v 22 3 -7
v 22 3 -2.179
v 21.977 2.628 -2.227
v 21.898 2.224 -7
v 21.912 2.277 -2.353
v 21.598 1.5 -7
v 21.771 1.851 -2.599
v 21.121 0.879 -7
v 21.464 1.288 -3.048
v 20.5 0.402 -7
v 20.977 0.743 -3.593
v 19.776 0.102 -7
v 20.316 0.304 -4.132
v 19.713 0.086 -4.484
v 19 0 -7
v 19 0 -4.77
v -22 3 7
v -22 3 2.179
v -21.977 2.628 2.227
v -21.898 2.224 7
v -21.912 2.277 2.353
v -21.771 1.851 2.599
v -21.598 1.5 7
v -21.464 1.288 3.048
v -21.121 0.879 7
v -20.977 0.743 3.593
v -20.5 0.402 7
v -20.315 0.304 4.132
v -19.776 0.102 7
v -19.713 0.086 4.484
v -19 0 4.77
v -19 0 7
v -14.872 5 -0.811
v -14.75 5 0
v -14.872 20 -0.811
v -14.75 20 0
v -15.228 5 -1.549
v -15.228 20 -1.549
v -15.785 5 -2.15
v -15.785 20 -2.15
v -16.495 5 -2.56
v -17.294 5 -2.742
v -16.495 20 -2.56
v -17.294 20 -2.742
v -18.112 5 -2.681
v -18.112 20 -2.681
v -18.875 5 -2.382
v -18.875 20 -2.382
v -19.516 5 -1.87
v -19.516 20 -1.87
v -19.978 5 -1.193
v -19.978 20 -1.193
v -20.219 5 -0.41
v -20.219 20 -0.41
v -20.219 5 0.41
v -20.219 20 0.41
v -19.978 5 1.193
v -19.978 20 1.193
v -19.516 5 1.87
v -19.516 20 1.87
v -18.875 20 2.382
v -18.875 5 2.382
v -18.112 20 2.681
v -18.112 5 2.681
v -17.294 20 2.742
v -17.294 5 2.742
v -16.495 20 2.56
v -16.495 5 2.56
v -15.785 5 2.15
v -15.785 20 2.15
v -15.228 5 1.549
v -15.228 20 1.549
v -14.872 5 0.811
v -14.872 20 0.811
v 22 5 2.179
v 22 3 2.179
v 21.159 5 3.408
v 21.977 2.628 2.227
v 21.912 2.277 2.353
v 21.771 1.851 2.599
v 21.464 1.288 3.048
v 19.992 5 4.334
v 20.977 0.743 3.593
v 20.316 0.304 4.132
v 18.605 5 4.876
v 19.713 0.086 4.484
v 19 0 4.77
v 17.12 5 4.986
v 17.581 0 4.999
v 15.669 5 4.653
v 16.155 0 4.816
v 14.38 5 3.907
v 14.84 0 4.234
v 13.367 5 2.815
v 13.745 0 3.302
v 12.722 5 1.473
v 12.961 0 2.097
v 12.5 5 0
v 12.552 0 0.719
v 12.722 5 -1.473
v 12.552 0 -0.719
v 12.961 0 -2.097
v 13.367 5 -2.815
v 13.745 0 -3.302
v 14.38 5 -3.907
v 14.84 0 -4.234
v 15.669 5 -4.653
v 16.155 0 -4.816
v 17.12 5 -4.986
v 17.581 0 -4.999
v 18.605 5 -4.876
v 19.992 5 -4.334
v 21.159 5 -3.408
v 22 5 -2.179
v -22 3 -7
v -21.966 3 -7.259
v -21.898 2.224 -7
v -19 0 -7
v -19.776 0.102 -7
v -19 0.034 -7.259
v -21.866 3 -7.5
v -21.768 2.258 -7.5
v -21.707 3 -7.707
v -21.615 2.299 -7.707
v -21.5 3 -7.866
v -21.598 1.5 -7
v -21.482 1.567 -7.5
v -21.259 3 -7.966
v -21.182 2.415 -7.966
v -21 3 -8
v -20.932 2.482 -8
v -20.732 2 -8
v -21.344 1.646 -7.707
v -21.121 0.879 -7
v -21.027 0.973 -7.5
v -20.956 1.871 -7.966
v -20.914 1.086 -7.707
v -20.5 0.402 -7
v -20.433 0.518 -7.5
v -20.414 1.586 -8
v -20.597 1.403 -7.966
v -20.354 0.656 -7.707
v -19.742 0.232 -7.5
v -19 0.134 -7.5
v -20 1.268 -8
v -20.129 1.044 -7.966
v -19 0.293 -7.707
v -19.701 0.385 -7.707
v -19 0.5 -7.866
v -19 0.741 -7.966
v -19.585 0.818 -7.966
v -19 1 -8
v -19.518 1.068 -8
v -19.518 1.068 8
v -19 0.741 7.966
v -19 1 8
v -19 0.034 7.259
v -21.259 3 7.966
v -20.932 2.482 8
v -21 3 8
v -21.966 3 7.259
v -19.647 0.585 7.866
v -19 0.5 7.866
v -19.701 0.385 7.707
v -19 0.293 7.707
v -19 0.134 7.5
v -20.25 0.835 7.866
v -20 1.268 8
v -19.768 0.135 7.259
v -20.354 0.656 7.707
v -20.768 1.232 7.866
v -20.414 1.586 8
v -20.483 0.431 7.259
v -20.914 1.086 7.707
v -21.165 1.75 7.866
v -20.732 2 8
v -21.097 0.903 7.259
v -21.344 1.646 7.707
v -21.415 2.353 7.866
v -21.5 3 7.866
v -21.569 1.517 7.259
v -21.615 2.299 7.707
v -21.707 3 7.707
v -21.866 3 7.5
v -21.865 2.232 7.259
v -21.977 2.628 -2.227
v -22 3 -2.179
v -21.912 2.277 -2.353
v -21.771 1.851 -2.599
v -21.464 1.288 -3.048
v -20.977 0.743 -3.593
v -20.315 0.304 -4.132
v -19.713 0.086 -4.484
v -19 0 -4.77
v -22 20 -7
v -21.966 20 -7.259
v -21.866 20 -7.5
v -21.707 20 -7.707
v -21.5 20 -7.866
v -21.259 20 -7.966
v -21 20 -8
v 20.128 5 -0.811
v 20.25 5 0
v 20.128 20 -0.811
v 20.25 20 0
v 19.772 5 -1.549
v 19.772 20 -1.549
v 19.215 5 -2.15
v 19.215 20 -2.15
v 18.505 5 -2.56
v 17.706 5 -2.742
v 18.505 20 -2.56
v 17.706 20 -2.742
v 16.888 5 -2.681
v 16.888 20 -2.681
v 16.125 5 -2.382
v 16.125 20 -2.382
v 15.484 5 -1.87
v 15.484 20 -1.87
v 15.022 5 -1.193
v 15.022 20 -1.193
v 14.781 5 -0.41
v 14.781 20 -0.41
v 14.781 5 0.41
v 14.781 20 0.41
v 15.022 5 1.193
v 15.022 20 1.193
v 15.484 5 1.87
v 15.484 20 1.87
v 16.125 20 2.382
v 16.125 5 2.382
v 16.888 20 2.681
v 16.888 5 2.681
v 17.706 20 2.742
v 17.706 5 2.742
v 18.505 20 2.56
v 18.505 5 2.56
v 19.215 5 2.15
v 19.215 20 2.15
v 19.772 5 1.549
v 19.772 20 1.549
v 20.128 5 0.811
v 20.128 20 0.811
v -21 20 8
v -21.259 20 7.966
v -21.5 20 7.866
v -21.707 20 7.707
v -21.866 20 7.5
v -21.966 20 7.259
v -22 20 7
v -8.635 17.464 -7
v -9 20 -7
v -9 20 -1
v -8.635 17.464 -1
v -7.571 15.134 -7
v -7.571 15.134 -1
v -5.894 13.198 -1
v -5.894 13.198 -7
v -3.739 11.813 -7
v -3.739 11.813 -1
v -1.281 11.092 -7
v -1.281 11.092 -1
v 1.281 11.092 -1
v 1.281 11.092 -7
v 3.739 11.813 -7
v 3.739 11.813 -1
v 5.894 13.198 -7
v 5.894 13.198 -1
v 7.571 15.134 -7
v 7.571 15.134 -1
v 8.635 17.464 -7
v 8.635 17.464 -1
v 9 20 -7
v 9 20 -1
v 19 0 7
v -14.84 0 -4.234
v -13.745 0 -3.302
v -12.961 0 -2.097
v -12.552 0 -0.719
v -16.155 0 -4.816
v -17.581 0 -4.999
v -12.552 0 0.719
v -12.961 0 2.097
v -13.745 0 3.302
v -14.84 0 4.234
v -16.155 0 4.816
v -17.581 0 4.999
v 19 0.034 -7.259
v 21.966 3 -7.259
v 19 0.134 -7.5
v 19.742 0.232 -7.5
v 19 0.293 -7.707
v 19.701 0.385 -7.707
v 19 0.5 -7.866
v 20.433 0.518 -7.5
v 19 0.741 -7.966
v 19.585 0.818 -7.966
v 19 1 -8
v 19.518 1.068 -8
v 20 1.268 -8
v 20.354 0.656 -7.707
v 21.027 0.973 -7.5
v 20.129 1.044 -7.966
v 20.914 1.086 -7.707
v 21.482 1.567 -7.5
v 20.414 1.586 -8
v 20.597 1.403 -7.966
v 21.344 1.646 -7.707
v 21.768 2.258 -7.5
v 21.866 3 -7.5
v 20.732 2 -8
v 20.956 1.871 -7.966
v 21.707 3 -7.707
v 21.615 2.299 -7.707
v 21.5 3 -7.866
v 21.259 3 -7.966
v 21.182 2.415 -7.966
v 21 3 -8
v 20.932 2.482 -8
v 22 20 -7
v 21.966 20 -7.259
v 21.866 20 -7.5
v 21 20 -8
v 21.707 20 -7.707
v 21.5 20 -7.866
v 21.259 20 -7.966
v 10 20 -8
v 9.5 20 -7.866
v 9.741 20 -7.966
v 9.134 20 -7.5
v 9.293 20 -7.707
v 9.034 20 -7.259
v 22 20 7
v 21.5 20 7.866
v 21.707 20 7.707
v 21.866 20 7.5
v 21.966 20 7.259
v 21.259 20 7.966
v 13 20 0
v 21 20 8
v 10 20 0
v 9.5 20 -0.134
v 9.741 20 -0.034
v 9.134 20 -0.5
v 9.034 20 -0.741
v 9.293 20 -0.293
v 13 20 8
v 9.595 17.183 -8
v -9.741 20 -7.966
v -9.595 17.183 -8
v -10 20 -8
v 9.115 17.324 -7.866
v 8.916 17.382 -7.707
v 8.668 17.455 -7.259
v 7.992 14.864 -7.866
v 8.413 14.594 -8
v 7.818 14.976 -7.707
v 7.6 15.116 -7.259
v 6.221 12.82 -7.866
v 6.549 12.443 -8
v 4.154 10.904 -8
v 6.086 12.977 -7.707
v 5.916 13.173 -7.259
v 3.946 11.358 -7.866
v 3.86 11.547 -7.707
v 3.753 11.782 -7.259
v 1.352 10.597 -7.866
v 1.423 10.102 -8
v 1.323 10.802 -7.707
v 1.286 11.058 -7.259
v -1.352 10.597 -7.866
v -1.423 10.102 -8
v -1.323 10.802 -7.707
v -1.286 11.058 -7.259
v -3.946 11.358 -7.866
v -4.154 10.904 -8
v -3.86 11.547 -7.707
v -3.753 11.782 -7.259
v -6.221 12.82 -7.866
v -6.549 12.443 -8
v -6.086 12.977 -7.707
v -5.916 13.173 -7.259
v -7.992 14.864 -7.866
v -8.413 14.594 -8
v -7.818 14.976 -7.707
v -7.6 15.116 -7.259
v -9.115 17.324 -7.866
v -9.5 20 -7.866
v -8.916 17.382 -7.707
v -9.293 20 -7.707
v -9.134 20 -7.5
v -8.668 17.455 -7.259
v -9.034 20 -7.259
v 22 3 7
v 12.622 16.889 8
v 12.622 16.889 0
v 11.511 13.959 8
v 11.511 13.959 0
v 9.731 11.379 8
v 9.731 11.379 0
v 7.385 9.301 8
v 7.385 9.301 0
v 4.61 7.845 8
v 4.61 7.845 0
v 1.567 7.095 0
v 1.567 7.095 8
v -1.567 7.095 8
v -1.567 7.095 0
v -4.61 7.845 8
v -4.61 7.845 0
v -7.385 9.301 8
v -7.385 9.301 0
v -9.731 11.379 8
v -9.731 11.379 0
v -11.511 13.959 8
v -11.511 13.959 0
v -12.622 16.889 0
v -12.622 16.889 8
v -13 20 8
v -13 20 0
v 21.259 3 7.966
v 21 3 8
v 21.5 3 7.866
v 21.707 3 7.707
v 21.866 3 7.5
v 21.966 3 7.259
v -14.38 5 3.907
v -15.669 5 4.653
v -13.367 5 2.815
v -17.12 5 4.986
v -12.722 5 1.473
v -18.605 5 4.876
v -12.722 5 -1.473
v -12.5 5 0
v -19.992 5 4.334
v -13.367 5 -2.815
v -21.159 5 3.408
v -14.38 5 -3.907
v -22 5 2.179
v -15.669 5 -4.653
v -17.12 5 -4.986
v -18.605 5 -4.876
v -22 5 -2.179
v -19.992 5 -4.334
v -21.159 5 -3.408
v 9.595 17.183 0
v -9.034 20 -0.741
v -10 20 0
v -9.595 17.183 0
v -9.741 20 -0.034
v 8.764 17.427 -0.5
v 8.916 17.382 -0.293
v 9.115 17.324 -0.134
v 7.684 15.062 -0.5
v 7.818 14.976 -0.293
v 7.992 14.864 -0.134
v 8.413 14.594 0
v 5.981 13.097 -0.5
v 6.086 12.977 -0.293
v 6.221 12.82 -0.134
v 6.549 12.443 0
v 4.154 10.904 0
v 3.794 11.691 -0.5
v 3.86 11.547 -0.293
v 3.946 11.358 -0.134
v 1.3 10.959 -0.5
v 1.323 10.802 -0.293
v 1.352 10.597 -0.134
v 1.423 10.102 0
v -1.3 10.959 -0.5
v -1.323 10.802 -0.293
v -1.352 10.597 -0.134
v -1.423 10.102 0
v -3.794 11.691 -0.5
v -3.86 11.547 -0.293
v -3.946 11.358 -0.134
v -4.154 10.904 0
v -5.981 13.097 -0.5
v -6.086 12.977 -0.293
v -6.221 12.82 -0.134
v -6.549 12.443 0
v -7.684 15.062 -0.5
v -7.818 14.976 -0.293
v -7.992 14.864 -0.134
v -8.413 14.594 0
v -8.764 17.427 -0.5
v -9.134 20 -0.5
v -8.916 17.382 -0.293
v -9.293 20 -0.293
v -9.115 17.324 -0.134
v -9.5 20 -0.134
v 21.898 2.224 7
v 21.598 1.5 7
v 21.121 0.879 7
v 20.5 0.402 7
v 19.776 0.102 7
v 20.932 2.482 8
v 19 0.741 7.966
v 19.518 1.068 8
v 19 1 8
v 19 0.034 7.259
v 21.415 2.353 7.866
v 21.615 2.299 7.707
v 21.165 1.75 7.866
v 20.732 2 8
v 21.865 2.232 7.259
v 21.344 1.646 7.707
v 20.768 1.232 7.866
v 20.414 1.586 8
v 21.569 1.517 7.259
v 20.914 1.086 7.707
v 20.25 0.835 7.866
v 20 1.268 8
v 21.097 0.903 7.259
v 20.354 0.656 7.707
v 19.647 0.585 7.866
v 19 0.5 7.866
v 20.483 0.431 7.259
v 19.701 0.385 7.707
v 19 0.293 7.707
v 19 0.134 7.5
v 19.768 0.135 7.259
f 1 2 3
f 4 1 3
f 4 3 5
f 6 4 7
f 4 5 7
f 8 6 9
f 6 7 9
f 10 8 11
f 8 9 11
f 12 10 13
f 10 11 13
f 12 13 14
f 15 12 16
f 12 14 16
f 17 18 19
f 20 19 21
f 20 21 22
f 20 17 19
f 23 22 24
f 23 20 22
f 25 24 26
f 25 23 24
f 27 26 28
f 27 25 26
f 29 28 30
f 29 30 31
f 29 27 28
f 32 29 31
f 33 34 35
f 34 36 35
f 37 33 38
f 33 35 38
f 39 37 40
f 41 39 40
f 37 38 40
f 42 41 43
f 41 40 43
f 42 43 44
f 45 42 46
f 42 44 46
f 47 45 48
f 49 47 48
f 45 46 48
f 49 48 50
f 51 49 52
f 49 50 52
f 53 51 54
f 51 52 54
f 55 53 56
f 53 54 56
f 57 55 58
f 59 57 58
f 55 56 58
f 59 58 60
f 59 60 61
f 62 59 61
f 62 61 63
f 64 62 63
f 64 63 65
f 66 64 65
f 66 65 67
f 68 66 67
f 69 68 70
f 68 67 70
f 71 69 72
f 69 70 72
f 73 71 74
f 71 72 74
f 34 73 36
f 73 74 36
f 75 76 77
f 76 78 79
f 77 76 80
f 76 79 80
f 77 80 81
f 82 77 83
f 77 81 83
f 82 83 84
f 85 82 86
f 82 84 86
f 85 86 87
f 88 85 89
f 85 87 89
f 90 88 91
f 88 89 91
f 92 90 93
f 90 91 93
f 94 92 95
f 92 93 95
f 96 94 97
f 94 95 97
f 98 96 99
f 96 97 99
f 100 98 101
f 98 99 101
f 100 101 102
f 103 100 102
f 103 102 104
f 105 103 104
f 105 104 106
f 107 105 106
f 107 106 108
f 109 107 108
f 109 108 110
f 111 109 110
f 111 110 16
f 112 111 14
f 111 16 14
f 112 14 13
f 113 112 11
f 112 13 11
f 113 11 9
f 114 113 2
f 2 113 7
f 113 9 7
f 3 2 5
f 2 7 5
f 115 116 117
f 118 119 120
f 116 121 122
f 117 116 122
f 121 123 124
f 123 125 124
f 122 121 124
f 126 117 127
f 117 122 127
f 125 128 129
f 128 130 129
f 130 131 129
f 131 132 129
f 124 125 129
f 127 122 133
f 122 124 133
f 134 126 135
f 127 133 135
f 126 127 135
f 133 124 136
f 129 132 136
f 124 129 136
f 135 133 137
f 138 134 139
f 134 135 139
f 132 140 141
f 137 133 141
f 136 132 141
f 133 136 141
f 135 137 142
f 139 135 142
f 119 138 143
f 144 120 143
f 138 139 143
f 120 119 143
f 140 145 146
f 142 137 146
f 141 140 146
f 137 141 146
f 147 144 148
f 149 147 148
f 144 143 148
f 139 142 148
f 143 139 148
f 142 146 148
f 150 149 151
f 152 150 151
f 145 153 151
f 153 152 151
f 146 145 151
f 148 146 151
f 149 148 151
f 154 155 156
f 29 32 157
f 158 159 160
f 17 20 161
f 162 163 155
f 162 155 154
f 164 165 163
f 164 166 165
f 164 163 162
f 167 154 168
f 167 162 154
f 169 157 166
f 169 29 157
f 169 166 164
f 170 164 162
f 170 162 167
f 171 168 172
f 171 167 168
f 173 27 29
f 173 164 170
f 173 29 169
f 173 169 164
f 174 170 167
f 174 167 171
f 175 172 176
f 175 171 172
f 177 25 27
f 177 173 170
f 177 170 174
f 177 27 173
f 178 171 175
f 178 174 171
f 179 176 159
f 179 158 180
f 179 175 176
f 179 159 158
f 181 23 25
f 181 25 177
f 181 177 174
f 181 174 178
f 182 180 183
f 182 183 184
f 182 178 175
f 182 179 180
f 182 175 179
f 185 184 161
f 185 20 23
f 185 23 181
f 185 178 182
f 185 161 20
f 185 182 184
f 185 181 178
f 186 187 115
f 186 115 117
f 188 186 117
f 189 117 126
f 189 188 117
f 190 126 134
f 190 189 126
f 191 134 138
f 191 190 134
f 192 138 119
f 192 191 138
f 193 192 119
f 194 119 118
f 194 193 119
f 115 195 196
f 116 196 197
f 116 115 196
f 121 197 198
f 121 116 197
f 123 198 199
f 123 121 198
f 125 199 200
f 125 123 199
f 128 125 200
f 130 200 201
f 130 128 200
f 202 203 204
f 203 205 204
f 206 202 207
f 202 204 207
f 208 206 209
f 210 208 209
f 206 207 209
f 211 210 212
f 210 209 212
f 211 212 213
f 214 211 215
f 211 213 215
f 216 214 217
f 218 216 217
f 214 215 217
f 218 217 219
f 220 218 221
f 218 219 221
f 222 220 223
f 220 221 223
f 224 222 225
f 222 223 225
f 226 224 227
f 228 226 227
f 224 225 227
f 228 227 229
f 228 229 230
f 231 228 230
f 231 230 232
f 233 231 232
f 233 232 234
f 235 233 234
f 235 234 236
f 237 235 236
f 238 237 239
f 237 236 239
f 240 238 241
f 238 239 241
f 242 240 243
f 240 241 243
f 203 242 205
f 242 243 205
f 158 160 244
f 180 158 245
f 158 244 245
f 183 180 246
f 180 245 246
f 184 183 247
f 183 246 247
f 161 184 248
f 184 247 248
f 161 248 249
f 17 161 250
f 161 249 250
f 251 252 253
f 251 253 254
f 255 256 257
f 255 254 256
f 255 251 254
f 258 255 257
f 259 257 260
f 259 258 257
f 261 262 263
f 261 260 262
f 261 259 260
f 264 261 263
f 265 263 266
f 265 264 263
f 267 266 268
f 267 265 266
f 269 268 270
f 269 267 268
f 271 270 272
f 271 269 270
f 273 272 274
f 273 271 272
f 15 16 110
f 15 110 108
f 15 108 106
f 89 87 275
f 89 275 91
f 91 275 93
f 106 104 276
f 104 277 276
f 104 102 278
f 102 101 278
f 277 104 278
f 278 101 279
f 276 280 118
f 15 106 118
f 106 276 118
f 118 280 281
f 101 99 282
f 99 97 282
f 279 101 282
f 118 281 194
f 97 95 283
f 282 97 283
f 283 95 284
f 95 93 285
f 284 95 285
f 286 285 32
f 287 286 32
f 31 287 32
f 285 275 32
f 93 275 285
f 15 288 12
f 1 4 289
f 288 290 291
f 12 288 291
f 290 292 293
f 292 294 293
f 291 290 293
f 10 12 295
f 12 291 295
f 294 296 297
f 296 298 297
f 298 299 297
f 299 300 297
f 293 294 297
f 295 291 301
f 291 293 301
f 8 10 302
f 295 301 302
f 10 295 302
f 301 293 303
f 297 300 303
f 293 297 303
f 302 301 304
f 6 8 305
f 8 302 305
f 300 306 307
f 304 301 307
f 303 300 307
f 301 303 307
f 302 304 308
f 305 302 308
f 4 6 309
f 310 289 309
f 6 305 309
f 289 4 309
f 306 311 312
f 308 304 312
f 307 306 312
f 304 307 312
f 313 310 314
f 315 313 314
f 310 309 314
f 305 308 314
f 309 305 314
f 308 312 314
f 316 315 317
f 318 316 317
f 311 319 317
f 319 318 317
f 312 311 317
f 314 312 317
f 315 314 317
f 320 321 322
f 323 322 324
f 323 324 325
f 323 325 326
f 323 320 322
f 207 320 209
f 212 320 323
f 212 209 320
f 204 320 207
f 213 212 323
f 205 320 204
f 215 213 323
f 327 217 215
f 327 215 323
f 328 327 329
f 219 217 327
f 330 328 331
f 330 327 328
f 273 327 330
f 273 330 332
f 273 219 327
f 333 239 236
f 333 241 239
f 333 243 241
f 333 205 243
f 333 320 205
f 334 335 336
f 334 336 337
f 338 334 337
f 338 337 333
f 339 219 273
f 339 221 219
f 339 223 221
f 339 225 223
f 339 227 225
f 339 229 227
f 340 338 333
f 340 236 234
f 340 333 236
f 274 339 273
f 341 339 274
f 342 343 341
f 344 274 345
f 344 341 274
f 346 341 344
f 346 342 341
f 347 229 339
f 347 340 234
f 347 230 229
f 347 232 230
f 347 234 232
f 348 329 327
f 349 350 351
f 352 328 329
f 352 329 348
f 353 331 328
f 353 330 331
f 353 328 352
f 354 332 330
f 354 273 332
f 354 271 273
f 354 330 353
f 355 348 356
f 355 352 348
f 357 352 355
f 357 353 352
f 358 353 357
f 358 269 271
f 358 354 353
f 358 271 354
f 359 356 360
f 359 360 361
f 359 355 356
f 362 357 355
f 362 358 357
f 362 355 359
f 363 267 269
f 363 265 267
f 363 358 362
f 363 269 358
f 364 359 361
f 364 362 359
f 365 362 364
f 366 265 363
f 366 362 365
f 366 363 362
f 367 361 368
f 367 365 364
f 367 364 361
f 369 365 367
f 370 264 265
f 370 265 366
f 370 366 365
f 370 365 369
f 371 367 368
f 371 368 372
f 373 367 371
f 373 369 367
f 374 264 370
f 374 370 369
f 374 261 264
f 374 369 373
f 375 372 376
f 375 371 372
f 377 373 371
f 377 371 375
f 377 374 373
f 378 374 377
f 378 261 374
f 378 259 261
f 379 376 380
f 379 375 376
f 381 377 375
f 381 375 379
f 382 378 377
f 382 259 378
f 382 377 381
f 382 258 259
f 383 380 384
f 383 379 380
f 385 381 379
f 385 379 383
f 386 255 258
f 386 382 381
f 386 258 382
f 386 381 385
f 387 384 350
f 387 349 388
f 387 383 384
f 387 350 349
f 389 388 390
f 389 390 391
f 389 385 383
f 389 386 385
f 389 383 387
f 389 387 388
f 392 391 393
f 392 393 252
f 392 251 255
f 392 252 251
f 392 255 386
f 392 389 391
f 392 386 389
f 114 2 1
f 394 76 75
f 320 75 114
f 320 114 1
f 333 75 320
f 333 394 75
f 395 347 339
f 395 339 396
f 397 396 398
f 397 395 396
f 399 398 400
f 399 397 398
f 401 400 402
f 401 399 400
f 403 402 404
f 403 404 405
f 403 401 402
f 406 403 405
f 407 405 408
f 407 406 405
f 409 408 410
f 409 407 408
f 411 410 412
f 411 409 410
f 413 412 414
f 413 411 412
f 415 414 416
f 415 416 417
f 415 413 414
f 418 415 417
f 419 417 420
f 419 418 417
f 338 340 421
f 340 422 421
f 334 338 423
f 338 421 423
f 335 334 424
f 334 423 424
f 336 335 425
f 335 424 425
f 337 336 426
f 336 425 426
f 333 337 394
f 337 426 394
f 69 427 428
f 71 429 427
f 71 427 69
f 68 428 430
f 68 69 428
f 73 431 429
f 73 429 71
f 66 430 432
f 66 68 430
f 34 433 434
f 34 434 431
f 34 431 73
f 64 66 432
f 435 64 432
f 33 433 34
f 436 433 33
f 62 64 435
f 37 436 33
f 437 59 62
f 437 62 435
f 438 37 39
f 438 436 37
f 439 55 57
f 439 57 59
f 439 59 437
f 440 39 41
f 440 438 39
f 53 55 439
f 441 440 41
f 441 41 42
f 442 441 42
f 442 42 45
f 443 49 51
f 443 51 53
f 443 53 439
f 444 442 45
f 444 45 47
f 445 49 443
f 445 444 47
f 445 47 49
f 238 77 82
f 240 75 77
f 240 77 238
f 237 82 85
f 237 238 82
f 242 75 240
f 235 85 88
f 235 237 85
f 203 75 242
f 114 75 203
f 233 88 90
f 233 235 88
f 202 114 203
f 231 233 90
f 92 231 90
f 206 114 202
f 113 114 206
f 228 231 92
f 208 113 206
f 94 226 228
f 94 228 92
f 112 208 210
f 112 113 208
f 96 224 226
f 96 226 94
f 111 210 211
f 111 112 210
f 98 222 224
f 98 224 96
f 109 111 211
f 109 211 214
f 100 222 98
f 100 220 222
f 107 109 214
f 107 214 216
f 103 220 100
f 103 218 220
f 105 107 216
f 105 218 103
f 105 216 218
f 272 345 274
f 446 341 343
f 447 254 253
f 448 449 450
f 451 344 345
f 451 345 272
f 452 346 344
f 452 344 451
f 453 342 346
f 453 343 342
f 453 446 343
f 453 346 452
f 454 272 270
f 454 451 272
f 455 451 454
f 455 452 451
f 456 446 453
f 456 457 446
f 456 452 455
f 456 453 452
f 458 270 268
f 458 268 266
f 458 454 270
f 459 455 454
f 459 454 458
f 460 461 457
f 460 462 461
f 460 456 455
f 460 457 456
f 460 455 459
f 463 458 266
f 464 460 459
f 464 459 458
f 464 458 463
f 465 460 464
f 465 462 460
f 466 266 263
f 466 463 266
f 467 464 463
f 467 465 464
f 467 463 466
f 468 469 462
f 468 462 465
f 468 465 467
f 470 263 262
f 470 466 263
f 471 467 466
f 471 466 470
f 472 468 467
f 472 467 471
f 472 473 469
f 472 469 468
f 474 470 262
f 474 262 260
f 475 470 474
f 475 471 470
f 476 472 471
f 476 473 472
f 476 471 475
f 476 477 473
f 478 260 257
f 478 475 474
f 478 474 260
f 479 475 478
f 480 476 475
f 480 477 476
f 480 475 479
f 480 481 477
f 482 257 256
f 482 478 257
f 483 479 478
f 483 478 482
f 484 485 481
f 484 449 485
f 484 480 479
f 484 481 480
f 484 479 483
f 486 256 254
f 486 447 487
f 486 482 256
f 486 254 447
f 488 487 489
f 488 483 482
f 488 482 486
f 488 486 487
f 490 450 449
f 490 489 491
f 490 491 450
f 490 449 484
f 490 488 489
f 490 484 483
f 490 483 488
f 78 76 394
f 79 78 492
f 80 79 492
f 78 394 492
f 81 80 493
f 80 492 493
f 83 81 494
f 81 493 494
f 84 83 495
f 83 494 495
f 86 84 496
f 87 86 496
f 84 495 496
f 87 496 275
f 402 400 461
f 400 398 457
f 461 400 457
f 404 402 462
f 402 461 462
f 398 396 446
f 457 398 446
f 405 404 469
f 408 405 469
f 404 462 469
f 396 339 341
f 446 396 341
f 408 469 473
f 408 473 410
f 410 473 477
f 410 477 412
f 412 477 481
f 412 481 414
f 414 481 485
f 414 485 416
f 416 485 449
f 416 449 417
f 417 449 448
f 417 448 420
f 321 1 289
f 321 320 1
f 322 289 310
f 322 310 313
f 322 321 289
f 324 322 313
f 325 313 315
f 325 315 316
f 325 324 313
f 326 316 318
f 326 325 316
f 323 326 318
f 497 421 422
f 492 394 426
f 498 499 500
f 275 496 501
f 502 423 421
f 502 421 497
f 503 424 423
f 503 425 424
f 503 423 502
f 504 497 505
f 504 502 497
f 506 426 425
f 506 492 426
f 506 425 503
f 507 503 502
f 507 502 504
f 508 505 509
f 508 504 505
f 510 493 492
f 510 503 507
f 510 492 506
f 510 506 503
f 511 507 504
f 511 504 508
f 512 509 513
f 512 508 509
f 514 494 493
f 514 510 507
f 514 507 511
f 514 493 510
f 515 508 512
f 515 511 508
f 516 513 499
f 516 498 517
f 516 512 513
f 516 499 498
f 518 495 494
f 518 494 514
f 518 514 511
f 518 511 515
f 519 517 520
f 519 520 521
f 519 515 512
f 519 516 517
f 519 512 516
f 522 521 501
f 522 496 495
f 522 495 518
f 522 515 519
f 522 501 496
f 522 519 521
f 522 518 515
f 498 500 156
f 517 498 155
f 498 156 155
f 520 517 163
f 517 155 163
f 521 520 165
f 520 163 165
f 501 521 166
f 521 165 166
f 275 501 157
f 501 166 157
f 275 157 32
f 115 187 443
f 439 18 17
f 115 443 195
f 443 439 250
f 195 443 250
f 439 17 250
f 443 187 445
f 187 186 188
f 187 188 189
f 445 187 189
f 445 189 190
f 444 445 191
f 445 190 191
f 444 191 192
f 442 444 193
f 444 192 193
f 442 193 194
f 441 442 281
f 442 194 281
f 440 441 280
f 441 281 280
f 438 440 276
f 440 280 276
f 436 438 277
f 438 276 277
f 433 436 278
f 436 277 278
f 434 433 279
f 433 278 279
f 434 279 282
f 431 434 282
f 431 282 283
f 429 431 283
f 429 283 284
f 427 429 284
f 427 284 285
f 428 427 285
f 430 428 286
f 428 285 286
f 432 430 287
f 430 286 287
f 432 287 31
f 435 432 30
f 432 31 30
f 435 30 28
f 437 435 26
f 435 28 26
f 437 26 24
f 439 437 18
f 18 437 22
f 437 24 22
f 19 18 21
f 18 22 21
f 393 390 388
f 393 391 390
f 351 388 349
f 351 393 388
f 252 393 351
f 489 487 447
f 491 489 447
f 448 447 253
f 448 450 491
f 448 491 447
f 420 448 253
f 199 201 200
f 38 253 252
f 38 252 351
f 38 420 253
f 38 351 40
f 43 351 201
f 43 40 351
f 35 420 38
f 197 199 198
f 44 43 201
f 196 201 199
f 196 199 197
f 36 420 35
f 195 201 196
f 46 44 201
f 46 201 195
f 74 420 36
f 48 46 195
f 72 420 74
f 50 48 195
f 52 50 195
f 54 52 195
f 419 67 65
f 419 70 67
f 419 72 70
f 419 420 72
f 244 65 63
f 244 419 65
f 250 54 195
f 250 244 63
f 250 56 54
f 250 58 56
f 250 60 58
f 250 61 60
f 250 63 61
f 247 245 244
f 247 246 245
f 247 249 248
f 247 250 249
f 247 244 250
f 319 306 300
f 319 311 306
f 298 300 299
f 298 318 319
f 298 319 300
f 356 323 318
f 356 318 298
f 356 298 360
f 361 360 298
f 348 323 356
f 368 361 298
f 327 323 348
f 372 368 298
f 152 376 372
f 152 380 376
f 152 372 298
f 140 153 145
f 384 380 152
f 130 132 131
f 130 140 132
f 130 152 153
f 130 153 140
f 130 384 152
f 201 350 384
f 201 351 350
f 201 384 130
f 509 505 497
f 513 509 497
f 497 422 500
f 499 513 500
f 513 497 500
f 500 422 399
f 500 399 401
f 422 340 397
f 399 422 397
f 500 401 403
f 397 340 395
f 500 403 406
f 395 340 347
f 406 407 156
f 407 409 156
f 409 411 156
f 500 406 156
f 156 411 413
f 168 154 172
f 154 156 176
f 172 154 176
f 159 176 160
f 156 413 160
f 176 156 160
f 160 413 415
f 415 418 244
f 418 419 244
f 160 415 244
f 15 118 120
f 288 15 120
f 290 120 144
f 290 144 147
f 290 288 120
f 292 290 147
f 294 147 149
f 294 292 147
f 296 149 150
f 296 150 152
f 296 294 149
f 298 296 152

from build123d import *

# Parameters (mm, degrees)
SZKIC1_W                                          = 22
SZKIC1_H                                          = 20
DODANIE_WYCI_GNI_CIE1_DEPTH                       = 8
WYTNIJ_WYCI_GNI_CIE1_DEPTH                        = 8
WYTNIJ_WYCI_GNI_CIE2_DEPTH                        = 31.789608637
WYTNIJ_WYCI_GNI_CIE2_DEPTH_BACK                   = 31.789608637
POG_BIENIE_WALCOWE_POD_M5_RUB_Z_BEM_W_D           = 5.5
POG_BIENIE_WALCOWE_POD_M5_RUB_Z_BEM_W_CBORE_D     = 10
POG_BIENIE_WALCOWE_POD_M5_RUB_Z_BEM_W_CBORE_DEPTH = 5
ZAOKR_GLENIE1_R                                   = 3
ZAOKR_GLENIE2_R                                   = 1


with BuildPart() as part:
    # Szkic1 → Dodanie-wyciągnięcie1 (new, symmetric)
    with BuildSketch(Plane.XY):
        with Locations((11, 10)):
            Rectangle(SZKIC1_W, SZKIC1_H)
    dodanie_wyci_gni_cie1 = extrude(amount=DODANIE_WYCI_GNI_CIE1_DEPTH, both=True)

    # Lustro1: Dodanie-wyciągnięcie1 across plane
    add(dodanie_wyci_gni_cie1.mirror(Plane(origin=(0, 20, 8), x_dir=(0, 0, 1), z_dir=(1, 0, 0))))

    # Szkic2 → Wytnij-wyciągnięcie1 (cut)
    with BuildSketch(Plane.XY.offset(8)):
        with BuildLine():
            Line((-13, 20), (13, 20))
            ThreePointArc((13, 20), (0, 7), (-13, 20))
        make_face()
    extrude(amount=-WYTNIJ_WYCI_GNI_CIE1_DEPTH, mode=Mode.SUBTRACT)

    # Szkic3 → Wytnij-wyciągnięcie2 (cut, two sides: drawn at the far end of the back side and taken through both)
    with BuildSketch(Plane.XY.offset(-WYTNIJ_WYCI_GNI_CIE2_DEPTH_BACK)):
        with BuildLine():
            ThreePointArc((-9, 20), (0, 11), (9, 20))
            Line((9, 20), (-9, 20))
        make_face()
    extrude(amount=WYTNIJ_WYCI_GNI_CIE2_DEPTH + WYTNIJ_WYCI_GNI_CIE2_DEPTH_BACK, mode=Mode.SUBTRACT)

    # Pogłębienie walcowe pod M5 Śrubę z łbem walcowym z gniazdem1 (through all)
    with Locations(Plane(origin=(0, 0, 0), x_dir=(-1, 0, 0), z_dir=(0, -1, 0))):
        with Locations((-17.5, 0), (17.5, 0)):
            CounterBoreHole(POG_BIENIE_WALCOWE_POD_M5_RUB_Z_BEM_W_D / 2, POG_BIENIE_WALCOWE_POD_M5_RUB_Z_BEM_W_CBORE_D / 2, POG_BIENIE_WALCOWE_POD_M5_RUB_Z_BEM_W_CBORE_DEPTH)

    # Zaokrąglenie1
    zaokr_glenie1_edges = [part.edges().sort_by_distance(p)[0] for p in [
        (-22, 0, 5.089724736),
        (-22, 0, -5.089724736),
        (22, 0, -5.089724736),
        (22, 0, 5.089724736),
    ]]
    fillet(zaokr_glenie1_edges, radius=ZAOKR_GLENIE1_R)

    # Zaokrąglenie2
    zaokr_glenie2_edges = [part.edges().sort_by_distance(p)[0] for p in [
        (-22, 11.5, 8),
        (-21.121320344, 0.878679656, 8),
        (0, 0, 8),
        (21.121320344, 0.878679656, 8),
        (0, 0, -8),
        (0, 11, -8),
        (22, 11.5, 8),
        (0, 11, 0),
        (22, 11.5, -8),
        (-21.121320344, 0.878679656, -8),
        (21.121320344, 0.878679656, -8),
    ]]
    fillet(zaokr_glenie2_edges, radius=ZAOKR_GLENIE2_R)


solid = part.part
